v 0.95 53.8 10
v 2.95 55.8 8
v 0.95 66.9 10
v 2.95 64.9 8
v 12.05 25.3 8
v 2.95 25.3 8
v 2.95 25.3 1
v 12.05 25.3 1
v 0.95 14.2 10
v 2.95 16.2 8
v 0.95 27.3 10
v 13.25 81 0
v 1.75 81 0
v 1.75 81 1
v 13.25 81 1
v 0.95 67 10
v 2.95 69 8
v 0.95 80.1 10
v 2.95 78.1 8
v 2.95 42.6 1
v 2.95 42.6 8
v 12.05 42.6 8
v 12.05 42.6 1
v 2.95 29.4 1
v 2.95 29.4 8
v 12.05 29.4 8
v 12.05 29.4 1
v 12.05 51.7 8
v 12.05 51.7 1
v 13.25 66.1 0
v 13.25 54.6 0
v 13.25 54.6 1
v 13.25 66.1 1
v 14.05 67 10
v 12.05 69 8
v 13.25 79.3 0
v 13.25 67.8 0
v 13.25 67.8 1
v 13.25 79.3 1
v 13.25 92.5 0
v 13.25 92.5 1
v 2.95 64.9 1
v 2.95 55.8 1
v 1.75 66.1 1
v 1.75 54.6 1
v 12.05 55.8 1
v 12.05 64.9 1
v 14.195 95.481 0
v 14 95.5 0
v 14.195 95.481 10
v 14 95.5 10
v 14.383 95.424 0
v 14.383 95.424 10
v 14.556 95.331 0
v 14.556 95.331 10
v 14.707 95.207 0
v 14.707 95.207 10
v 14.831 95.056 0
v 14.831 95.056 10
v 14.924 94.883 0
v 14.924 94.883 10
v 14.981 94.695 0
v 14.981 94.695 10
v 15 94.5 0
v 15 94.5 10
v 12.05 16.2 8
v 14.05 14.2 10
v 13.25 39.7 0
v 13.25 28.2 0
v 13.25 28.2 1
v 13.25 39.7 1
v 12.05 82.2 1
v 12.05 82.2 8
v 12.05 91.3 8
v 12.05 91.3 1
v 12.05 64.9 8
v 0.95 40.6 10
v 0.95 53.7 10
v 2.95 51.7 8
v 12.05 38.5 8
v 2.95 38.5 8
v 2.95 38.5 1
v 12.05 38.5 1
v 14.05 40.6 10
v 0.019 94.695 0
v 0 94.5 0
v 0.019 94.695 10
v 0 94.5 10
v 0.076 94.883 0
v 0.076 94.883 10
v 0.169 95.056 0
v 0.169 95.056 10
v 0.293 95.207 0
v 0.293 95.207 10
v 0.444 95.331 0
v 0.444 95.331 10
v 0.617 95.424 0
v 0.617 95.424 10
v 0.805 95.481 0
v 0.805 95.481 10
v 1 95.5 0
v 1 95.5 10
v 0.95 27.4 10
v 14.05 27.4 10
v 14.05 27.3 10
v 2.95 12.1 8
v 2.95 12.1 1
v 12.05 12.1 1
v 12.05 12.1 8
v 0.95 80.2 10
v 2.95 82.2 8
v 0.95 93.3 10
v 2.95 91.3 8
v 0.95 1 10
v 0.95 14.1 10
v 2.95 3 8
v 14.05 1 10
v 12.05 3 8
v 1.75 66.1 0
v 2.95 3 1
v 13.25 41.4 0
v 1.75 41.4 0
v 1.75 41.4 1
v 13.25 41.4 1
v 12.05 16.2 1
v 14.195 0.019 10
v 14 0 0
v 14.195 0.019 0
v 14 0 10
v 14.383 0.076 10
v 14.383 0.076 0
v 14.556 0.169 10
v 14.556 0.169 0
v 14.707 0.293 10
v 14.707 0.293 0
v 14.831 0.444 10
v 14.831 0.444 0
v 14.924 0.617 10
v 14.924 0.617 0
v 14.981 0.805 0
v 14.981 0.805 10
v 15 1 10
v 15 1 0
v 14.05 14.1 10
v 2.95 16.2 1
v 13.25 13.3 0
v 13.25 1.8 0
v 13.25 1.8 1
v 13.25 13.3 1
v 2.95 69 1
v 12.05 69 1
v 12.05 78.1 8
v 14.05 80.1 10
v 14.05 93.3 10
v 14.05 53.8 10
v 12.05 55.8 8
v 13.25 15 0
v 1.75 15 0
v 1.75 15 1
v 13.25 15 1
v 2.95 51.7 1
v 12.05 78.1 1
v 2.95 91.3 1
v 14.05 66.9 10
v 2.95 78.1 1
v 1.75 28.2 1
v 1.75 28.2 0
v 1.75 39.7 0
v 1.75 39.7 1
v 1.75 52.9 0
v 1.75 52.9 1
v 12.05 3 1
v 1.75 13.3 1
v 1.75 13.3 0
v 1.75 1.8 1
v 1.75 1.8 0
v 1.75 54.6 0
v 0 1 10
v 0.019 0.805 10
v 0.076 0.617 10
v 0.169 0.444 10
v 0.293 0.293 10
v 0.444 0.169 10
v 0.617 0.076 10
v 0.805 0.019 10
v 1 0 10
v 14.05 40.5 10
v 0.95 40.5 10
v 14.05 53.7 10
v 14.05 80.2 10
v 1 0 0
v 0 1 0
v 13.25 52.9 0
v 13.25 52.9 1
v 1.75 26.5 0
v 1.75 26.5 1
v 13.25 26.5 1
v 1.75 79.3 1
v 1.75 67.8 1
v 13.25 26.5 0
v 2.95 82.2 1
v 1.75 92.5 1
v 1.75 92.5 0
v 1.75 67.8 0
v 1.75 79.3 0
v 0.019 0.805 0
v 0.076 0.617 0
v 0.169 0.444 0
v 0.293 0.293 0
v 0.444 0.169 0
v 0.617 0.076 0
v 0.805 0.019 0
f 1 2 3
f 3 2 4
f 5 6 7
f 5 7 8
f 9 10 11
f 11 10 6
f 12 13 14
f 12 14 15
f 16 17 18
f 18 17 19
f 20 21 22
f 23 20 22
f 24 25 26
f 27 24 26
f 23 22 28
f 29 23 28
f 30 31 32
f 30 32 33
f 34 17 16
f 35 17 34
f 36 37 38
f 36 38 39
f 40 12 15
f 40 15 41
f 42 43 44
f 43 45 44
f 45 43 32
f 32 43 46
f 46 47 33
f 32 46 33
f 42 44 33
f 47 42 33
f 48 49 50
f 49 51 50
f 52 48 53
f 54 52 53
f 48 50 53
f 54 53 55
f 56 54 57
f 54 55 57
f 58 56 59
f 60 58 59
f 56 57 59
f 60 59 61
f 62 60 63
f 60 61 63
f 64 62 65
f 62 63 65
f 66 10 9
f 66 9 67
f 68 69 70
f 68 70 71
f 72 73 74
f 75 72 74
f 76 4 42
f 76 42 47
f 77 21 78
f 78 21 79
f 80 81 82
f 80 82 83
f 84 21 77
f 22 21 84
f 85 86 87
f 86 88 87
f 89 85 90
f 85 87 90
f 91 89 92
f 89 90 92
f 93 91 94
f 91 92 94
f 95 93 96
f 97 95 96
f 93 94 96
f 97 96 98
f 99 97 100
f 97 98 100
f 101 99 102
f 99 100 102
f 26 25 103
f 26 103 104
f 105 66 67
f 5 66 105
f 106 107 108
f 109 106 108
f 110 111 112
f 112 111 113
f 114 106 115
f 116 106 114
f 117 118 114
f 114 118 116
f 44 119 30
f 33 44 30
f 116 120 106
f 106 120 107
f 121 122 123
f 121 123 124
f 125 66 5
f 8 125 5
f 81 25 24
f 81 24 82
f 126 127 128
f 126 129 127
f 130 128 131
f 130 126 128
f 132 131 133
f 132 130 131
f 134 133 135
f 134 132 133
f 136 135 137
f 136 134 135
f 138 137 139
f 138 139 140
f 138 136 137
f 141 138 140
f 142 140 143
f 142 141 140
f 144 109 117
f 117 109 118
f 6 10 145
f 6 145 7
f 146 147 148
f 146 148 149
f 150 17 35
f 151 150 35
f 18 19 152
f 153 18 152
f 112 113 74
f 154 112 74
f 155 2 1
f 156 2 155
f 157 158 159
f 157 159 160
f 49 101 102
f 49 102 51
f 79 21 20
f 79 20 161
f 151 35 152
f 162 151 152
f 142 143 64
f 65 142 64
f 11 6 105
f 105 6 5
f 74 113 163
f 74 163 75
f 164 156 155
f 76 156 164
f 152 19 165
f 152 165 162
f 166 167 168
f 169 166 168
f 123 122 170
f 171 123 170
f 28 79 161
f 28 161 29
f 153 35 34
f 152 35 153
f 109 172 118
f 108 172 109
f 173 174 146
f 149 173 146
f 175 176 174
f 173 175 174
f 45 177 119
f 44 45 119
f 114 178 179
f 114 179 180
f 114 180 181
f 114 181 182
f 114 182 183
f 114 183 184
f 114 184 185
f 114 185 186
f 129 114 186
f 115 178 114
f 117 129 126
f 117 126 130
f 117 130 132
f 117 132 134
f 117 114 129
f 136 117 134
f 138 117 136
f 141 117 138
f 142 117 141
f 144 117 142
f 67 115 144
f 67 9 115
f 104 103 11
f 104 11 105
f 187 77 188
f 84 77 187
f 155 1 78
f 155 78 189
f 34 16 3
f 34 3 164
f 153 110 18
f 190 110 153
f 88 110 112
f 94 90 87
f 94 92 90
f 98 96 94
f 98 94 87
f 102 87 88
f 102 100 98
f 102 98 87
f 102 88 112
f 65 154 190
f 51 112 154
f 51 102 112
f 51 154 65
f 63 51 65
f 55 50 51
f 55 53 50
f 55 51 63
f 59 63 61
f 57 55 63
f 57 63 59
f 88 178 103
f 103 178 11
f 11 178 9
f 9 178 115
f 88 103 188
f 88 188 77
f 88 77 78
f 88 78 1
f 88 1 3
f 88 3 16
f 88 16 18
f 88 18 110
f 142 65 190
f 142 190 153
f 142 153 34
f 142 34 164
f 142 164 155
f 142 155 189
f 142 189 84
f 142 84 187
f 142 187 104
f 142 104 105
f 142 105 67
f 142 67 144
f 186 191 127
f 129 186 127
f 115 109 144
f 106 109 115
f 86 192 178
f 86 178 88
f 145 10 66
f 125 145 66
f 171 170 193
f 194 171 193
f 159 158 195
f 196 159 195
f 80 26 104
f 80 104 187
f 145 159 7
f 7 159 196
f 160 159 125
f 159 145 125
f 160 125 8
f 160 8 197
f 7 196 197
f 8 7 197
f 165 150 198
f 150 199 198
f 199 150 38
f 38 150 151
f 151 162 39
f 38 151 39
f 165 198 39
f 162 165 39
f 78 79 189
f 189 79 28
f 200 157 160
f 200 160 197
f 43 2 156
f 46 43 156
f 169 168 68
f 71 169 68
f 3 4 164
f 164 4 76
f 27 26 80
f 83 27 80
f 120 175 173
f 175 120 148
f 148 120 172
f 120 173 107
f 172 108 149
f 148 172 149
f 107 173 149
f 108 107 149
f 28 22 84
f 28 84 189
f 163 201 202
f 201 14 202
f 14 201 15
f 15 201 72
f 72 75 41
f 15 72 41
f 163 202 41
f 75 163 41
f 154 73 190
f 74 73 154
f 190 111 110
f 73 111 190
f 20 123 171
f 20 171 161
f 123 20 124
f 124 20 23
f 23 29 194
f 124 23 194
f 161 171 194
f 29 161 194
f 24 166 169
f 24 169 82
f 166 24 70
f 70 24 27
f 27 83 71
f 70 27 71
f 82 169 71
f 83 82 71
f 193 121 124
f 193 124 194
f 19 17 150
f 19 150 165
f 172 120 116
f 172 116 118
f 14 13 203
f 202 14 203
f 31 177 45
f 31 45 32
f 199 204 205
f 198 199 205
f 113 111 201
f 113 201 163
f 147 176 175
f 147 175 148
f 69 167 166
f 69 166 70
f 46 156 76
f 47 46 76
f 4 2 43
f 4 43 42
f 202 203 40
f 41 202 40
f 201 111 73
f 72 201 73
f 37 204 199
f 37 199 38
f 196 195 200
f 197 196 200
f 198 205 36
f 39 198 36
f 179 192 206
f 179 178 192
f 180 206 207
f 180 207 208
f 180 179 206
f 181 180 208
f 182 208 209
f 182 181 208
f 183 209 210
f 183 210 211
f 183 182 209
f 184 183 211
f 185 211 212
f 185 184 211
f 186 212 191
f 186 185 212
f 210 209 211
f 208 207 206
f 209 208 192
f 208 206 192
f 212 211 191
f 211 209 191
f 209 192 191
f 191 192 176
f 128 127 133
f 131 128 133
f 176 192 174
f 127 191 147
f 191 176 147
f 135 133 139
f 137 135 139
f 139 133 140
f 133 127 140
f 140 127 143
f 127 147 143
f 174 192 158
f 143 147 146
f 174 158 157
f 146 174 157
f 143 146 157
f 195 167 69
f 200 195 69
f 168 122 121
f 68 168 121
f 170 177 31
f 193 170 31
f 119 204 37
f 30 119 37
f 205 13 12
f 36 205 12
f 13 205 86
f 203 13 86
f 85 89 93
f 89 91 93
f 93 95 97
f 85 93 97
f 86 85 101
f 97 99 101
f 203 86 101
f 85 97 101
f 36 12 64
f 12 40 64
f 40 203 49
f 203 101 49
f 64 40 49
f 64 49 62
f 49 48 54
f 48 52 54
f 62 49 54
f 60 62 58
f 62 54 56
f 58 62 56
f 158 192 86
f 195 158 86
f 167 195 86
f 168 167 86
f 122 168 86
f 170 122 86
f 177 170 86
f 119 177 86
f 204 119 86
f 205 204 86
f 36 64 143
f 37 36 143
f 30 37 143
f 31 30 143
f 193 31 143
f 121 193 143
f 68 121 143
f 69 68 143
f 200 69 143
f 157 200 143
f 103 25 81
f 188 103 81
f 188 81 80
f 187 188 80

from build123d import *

# Parameters (mm, degrees)
SKETCH_W               = 15
SKETCH_H               = 95.5
PAD_DEPTH              = 10
SKETCH001_W            = 9.1
SKETCH001_H            = 9.1
POCKET_DEPTH           = 0.001
POCKET_DEPTH_BACK      = 10.001
LINEARPATTERN_COUNT    = 7
LINEARPATTERN_PITCH    = 13.2
SKETCH002_W            = 11.5
SKETCH002_H            = 11.5
POCKET001_DEPTH        = 1
LINEARPATTERN001_COUNT = 7
LINEARPATTERN001_PITCH = 13.2
CHAMFER_SIZE           = 2
FILLET_R               = 1


with BuildPart() as part:
    # Sketch → Pad (new body)
    with BuildSketch(Plane.XY):
        with Locations((7.5, 47.75)):
            Rectangle(SKETCH_W, SKETCH_H)
    extrude(amount=PAD_DEPTH)

    # Sketch001 → Pocket (cut, two sides)
    with BuildSketch(Plane.XY) as pocket_sk:
        with Locations((7.5, 7.55)):
            Rectangle(SKETCH001_W, SKETCH001_H)
    pocket = extrude(amount=-POCKET_DEPTH, mode=Mode.SUBTRACT) + extrude(pocket_sk.sketch, amount=POCKET_DEPTH_BACK, mode=Mode.SUBTRACT)

    # LinearPattern: Pocket ×7
    with Locations(*[(0, i * LINEARPATTERN_PITCH, 0) for i in range(1, LINEARPATTERN_COUNT)]):
        add(pocket, mode=Mode.SUBTRACT)

    # Sketch002 → Pocket001 (cut)
    with BuildSketch(Plane.XY):
        with Locations((7.5, 7.55)):
            Rectangle(SKETCH002_W, SKETCH002_H)
    pocket001 = extrude(amount=POCKET001_DEPTH, mode=Mode.SUBTRACT)

    # LinearPattern001: Pocket001 ×7
    with Locations(*[(0, i * LINEARPATTERN001_PITCH, 0) for i in range(1, LINEARPATTERN001_COUNT)]):
        add(pocket001, mode=Mode.SUBTRACT)

    # Chamfer
    chamfer_edges = [part.edges().sort_by_distance(p)[0] for p in [
        (12.05, 7.55, 10),
        (7.5, 3, 10),
        (2.95, 7.55, 10),
        (7.5, 12.1, 10),
        (2.95, 20.75, 10),
        (7.5, 16.2, 10),
        (7.5, 25.3, 10),
        (12.05, 20.75, 10),
        (7.5, 29.4, 10),
        (2.95, 33.95, 10),
        (7.5, 38.5, 10),
        (12.05, 33.95, 10),
        (7.5, 42.6, 10),
        (2.95, 47.15, 10),
        (7.5, 51.7, 10),
        (12.05, 47.15, 10),
        (2.95, 60.35, 10),
        (7.5, 55.8, 10),
        (7.5, 64.9, 10),
        (12.05, 60.35, 10),
        (7.5, 69, 10),
        (2.95, 73.55, 10),
        (7.5, 78.1, 10),
        (12.05, 73.55, 10),
        (7.5, 82.2, 10),
        (2.95, 86.75, 10),
        (7.5, 91.3, 10),
        (12.05, 86.75, 10),
    ]]
    chamfer(chamfer_edges, length=CHAMFER_SIZE)

    # Fillet
    fillet_edges = [part.edges().sort_by_distance(p)[0] for p in [
        (15, 0, 5),
        (0, 0, 5),
        (15, 95.5, 5),
        (0, 95.5, 5),
    ]]
    fillet(fillet_edges, radius=FILLET_R)


solid = part.part
